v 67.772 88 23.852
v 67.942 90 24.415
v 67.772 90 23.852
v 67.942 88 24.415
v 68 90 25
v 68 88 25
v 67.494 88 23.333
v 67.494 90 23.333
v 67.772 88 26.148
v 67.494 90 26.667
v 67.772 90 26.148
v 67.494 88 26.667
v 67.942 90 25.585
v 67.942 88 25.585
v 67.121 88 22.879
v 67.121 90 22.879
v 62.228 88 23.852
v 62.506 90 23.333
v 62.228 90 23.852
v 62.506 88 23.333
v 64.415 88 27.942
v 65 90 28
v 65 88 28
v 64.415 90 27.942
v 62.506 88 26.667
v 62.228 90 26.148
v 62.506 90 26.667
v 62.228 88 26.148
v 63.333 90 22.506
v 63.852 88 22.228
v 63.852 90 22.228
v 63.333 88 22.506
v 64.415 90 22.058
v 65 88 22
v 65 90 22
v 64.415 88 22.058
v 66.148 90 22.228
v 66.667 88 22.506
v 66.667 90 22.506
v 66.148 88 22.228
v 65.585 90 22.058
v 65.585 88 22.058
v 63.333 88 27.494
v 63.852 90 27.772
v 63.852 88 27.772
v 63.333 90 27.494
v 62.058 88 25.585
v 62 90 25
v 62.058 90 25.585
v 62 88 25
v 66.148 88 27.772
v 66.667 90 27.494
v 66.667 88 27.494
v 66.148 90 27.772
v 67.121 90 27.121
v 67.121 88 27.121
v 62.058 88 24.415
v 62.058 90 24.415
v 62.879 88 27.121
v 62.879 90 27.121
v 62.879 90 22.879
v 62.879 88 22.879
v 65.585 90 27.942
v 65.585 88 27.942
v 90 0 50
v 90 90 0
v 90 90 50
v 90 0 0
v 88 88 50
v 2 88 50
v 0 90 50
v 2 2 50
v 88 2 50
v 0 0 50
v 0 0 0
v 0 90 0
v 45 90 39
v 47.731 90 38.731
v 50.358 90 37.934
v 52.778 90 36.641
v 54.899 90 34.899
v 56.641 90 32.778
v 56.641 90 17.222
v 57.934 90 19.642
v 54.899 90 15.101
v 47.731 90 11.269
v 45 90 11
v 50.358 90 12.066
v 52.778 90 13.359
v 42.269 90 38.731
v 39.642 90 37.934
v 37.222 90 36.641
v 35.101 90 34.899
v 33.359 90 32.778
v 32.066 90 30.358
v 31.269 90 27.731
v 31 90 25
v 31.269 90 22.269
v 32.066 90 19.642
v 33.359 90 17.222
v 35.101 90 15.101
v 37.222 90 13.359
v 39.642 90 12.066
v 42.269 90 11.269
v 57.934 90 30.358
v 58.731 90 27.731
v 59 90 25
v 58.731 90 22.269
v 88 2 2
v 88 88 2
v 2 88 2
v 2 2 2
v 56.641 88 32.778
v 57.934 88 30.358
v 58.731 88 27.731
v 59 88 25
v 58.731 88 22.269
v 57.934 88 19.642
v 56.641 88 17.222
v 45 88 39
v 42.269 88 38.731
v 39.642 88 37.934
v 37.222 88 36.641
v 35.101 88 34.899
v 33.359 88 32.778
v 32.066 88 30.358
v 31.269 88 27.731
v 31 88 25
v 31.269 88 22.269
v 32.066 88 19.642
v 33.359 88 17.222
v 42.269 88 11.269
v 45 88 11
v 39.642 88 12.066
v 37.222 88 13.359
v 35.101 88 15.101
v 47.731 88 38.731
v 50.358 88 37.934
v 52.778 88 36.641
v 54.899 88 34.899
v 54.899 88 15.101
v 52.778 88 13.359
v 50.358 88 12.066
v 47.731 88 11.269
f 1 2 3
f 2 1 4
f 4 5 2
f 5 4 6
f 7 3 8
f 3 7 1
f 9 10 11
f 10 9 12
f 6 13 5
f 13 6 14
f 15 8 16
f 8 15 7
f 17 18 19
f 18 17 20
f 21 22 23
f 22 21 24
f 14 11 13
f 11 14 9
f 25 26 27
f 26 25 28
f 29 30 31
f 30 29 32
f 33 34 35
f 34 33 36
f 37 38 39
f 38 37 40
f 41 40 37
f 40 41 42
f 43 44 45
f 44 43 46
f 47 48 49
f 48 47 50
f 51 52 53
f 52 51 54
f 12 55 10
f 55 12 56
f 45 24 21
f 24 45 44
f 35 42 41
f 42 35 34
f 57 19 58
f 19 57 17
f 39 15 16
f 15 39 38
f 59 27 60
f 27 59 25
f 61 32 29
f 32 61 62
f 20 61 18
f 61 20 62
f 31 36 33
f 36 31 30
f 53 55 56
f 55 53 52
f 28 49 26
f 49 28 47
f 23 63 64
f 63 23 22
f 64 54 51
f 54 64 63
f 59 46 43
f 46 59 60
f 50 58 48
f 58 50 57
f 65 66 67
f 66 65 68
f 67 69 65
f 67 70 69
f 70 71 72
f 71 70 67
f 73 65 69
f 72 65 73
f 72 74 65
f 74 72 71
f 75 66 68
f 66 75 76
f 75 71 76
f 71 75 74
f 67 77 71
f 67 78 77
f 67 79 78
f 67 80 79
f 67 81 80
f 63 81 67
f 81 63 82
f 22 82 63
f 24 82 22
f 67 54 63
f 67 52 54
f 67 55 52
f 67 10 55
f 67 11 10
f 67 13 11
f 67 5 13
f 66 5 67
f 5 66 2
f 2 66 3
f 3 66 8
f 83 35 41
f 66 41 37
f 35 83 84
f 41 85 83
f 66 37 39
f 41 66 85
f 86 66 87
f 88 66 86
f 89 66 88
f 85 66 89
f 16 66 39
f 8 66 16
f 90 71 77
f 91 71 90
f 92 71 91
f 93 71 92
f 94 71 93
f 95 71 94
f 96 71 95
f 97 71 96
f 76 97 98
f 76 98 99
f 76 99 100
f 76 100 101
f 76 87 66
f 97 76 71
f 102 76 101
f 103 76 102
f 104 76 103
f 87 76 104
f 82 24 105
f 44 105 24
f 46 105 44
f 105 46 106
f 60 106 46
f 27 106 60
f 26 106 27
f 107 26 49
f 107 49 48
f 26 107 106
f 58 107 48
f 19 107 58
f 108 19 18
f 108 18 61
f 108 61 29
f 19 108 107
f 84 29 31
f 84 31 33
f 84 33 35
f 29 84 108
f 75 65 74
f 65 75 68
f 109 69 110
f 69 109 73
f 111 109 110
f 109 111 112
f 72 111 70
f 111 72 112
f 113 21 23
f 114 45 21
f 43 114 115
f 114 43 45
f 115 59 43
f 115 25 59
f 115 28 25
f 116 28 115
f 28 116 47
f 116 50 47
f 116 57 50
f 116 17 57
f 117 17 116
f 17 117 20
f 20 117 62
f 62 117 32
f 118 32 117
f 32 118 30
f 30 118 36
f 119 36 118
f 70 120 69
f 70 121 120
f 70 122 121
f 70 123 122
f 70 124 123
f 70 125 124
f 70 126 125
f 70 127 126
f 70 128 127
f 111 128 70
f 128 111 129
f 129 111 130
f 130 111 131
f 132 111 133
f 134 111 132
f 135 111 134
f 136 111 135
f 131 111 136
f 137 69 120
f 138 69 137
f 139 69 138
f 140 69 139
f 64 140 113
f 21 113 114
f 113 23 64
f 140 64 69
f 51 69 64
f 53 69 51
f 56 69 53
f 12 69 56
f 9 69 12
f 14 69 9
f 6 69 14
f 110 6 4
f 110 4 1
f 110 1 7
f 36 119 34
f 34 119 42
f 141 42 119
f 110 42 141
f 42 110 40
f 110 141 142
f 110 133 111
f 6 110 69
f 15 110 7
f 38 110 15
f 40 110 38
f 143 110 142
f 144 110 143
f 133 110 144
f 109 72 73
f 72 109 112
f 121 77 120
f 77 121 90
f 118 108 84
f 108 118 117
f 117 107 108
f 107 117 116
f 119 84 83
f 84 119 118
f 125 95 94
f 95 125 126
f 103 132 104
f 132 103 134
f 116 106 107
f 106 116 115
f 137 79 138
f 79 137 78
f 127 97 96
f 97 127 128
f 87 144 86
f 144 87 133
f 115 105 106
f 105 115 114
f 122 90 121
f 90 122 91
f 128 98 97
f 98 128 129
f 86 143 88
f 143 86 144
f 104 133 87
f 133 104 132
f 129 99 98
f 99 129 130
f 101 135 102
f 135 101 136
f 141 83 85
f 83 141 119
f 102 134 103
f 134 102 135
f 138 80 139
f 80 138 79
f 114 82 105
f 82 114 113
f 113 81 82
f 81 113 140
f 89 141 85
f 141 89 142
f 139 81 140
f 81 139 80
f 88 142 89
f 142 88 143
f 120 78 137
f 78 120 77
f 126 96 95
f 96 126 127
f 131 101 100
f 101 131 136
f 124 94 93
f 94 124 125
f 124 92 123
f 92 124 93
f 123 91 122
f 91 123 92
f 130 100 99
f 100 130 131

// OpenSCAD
$fn = 32;

// ----------------------------------------------------------------------
// Vent box: roundvent enclosure
// ----------------------------------------------------------------------

// --- parameters (mm) ---
box_l = 90;               // box length, X
box_w = 90;               // box width, Y
box_h = 50;               // box height, Z
wall_t = 2;               // shell wall thickness
vent_d = 28;              // central vent diameter
ring_d = 6;               // ring hole diameter
n_ring = 8;               // holes in the ring
ring_r = 20;              // ring radius

ring_step = 360 / n_ring;  // ring hole angular step

difference() {
  cube([box_l, box_w, box_h]);
  translate([wall_t, wall_t, wall_t])
    cube([box_l - 2 * wall_t, box_w - 2 * wall_t, box_h]);
  translate([box_l / 2, box_w - wall_t - 1, box_h / 2])
    rotate([-90, 0, 0]) cylinder(h = wall_t + 2, d = vent_d);
  for (i = [0 : n_ring - 1])
    translate([box_l / 2, box_w - wall_t - 1, box_h / 2])
      rotate([0, 0, i * ring_step])
        translate([ring_r, 0, 0]) rotate([-90, 0, 0])
          cylinder(h = wall_t + 2, d = ring_d);
}
